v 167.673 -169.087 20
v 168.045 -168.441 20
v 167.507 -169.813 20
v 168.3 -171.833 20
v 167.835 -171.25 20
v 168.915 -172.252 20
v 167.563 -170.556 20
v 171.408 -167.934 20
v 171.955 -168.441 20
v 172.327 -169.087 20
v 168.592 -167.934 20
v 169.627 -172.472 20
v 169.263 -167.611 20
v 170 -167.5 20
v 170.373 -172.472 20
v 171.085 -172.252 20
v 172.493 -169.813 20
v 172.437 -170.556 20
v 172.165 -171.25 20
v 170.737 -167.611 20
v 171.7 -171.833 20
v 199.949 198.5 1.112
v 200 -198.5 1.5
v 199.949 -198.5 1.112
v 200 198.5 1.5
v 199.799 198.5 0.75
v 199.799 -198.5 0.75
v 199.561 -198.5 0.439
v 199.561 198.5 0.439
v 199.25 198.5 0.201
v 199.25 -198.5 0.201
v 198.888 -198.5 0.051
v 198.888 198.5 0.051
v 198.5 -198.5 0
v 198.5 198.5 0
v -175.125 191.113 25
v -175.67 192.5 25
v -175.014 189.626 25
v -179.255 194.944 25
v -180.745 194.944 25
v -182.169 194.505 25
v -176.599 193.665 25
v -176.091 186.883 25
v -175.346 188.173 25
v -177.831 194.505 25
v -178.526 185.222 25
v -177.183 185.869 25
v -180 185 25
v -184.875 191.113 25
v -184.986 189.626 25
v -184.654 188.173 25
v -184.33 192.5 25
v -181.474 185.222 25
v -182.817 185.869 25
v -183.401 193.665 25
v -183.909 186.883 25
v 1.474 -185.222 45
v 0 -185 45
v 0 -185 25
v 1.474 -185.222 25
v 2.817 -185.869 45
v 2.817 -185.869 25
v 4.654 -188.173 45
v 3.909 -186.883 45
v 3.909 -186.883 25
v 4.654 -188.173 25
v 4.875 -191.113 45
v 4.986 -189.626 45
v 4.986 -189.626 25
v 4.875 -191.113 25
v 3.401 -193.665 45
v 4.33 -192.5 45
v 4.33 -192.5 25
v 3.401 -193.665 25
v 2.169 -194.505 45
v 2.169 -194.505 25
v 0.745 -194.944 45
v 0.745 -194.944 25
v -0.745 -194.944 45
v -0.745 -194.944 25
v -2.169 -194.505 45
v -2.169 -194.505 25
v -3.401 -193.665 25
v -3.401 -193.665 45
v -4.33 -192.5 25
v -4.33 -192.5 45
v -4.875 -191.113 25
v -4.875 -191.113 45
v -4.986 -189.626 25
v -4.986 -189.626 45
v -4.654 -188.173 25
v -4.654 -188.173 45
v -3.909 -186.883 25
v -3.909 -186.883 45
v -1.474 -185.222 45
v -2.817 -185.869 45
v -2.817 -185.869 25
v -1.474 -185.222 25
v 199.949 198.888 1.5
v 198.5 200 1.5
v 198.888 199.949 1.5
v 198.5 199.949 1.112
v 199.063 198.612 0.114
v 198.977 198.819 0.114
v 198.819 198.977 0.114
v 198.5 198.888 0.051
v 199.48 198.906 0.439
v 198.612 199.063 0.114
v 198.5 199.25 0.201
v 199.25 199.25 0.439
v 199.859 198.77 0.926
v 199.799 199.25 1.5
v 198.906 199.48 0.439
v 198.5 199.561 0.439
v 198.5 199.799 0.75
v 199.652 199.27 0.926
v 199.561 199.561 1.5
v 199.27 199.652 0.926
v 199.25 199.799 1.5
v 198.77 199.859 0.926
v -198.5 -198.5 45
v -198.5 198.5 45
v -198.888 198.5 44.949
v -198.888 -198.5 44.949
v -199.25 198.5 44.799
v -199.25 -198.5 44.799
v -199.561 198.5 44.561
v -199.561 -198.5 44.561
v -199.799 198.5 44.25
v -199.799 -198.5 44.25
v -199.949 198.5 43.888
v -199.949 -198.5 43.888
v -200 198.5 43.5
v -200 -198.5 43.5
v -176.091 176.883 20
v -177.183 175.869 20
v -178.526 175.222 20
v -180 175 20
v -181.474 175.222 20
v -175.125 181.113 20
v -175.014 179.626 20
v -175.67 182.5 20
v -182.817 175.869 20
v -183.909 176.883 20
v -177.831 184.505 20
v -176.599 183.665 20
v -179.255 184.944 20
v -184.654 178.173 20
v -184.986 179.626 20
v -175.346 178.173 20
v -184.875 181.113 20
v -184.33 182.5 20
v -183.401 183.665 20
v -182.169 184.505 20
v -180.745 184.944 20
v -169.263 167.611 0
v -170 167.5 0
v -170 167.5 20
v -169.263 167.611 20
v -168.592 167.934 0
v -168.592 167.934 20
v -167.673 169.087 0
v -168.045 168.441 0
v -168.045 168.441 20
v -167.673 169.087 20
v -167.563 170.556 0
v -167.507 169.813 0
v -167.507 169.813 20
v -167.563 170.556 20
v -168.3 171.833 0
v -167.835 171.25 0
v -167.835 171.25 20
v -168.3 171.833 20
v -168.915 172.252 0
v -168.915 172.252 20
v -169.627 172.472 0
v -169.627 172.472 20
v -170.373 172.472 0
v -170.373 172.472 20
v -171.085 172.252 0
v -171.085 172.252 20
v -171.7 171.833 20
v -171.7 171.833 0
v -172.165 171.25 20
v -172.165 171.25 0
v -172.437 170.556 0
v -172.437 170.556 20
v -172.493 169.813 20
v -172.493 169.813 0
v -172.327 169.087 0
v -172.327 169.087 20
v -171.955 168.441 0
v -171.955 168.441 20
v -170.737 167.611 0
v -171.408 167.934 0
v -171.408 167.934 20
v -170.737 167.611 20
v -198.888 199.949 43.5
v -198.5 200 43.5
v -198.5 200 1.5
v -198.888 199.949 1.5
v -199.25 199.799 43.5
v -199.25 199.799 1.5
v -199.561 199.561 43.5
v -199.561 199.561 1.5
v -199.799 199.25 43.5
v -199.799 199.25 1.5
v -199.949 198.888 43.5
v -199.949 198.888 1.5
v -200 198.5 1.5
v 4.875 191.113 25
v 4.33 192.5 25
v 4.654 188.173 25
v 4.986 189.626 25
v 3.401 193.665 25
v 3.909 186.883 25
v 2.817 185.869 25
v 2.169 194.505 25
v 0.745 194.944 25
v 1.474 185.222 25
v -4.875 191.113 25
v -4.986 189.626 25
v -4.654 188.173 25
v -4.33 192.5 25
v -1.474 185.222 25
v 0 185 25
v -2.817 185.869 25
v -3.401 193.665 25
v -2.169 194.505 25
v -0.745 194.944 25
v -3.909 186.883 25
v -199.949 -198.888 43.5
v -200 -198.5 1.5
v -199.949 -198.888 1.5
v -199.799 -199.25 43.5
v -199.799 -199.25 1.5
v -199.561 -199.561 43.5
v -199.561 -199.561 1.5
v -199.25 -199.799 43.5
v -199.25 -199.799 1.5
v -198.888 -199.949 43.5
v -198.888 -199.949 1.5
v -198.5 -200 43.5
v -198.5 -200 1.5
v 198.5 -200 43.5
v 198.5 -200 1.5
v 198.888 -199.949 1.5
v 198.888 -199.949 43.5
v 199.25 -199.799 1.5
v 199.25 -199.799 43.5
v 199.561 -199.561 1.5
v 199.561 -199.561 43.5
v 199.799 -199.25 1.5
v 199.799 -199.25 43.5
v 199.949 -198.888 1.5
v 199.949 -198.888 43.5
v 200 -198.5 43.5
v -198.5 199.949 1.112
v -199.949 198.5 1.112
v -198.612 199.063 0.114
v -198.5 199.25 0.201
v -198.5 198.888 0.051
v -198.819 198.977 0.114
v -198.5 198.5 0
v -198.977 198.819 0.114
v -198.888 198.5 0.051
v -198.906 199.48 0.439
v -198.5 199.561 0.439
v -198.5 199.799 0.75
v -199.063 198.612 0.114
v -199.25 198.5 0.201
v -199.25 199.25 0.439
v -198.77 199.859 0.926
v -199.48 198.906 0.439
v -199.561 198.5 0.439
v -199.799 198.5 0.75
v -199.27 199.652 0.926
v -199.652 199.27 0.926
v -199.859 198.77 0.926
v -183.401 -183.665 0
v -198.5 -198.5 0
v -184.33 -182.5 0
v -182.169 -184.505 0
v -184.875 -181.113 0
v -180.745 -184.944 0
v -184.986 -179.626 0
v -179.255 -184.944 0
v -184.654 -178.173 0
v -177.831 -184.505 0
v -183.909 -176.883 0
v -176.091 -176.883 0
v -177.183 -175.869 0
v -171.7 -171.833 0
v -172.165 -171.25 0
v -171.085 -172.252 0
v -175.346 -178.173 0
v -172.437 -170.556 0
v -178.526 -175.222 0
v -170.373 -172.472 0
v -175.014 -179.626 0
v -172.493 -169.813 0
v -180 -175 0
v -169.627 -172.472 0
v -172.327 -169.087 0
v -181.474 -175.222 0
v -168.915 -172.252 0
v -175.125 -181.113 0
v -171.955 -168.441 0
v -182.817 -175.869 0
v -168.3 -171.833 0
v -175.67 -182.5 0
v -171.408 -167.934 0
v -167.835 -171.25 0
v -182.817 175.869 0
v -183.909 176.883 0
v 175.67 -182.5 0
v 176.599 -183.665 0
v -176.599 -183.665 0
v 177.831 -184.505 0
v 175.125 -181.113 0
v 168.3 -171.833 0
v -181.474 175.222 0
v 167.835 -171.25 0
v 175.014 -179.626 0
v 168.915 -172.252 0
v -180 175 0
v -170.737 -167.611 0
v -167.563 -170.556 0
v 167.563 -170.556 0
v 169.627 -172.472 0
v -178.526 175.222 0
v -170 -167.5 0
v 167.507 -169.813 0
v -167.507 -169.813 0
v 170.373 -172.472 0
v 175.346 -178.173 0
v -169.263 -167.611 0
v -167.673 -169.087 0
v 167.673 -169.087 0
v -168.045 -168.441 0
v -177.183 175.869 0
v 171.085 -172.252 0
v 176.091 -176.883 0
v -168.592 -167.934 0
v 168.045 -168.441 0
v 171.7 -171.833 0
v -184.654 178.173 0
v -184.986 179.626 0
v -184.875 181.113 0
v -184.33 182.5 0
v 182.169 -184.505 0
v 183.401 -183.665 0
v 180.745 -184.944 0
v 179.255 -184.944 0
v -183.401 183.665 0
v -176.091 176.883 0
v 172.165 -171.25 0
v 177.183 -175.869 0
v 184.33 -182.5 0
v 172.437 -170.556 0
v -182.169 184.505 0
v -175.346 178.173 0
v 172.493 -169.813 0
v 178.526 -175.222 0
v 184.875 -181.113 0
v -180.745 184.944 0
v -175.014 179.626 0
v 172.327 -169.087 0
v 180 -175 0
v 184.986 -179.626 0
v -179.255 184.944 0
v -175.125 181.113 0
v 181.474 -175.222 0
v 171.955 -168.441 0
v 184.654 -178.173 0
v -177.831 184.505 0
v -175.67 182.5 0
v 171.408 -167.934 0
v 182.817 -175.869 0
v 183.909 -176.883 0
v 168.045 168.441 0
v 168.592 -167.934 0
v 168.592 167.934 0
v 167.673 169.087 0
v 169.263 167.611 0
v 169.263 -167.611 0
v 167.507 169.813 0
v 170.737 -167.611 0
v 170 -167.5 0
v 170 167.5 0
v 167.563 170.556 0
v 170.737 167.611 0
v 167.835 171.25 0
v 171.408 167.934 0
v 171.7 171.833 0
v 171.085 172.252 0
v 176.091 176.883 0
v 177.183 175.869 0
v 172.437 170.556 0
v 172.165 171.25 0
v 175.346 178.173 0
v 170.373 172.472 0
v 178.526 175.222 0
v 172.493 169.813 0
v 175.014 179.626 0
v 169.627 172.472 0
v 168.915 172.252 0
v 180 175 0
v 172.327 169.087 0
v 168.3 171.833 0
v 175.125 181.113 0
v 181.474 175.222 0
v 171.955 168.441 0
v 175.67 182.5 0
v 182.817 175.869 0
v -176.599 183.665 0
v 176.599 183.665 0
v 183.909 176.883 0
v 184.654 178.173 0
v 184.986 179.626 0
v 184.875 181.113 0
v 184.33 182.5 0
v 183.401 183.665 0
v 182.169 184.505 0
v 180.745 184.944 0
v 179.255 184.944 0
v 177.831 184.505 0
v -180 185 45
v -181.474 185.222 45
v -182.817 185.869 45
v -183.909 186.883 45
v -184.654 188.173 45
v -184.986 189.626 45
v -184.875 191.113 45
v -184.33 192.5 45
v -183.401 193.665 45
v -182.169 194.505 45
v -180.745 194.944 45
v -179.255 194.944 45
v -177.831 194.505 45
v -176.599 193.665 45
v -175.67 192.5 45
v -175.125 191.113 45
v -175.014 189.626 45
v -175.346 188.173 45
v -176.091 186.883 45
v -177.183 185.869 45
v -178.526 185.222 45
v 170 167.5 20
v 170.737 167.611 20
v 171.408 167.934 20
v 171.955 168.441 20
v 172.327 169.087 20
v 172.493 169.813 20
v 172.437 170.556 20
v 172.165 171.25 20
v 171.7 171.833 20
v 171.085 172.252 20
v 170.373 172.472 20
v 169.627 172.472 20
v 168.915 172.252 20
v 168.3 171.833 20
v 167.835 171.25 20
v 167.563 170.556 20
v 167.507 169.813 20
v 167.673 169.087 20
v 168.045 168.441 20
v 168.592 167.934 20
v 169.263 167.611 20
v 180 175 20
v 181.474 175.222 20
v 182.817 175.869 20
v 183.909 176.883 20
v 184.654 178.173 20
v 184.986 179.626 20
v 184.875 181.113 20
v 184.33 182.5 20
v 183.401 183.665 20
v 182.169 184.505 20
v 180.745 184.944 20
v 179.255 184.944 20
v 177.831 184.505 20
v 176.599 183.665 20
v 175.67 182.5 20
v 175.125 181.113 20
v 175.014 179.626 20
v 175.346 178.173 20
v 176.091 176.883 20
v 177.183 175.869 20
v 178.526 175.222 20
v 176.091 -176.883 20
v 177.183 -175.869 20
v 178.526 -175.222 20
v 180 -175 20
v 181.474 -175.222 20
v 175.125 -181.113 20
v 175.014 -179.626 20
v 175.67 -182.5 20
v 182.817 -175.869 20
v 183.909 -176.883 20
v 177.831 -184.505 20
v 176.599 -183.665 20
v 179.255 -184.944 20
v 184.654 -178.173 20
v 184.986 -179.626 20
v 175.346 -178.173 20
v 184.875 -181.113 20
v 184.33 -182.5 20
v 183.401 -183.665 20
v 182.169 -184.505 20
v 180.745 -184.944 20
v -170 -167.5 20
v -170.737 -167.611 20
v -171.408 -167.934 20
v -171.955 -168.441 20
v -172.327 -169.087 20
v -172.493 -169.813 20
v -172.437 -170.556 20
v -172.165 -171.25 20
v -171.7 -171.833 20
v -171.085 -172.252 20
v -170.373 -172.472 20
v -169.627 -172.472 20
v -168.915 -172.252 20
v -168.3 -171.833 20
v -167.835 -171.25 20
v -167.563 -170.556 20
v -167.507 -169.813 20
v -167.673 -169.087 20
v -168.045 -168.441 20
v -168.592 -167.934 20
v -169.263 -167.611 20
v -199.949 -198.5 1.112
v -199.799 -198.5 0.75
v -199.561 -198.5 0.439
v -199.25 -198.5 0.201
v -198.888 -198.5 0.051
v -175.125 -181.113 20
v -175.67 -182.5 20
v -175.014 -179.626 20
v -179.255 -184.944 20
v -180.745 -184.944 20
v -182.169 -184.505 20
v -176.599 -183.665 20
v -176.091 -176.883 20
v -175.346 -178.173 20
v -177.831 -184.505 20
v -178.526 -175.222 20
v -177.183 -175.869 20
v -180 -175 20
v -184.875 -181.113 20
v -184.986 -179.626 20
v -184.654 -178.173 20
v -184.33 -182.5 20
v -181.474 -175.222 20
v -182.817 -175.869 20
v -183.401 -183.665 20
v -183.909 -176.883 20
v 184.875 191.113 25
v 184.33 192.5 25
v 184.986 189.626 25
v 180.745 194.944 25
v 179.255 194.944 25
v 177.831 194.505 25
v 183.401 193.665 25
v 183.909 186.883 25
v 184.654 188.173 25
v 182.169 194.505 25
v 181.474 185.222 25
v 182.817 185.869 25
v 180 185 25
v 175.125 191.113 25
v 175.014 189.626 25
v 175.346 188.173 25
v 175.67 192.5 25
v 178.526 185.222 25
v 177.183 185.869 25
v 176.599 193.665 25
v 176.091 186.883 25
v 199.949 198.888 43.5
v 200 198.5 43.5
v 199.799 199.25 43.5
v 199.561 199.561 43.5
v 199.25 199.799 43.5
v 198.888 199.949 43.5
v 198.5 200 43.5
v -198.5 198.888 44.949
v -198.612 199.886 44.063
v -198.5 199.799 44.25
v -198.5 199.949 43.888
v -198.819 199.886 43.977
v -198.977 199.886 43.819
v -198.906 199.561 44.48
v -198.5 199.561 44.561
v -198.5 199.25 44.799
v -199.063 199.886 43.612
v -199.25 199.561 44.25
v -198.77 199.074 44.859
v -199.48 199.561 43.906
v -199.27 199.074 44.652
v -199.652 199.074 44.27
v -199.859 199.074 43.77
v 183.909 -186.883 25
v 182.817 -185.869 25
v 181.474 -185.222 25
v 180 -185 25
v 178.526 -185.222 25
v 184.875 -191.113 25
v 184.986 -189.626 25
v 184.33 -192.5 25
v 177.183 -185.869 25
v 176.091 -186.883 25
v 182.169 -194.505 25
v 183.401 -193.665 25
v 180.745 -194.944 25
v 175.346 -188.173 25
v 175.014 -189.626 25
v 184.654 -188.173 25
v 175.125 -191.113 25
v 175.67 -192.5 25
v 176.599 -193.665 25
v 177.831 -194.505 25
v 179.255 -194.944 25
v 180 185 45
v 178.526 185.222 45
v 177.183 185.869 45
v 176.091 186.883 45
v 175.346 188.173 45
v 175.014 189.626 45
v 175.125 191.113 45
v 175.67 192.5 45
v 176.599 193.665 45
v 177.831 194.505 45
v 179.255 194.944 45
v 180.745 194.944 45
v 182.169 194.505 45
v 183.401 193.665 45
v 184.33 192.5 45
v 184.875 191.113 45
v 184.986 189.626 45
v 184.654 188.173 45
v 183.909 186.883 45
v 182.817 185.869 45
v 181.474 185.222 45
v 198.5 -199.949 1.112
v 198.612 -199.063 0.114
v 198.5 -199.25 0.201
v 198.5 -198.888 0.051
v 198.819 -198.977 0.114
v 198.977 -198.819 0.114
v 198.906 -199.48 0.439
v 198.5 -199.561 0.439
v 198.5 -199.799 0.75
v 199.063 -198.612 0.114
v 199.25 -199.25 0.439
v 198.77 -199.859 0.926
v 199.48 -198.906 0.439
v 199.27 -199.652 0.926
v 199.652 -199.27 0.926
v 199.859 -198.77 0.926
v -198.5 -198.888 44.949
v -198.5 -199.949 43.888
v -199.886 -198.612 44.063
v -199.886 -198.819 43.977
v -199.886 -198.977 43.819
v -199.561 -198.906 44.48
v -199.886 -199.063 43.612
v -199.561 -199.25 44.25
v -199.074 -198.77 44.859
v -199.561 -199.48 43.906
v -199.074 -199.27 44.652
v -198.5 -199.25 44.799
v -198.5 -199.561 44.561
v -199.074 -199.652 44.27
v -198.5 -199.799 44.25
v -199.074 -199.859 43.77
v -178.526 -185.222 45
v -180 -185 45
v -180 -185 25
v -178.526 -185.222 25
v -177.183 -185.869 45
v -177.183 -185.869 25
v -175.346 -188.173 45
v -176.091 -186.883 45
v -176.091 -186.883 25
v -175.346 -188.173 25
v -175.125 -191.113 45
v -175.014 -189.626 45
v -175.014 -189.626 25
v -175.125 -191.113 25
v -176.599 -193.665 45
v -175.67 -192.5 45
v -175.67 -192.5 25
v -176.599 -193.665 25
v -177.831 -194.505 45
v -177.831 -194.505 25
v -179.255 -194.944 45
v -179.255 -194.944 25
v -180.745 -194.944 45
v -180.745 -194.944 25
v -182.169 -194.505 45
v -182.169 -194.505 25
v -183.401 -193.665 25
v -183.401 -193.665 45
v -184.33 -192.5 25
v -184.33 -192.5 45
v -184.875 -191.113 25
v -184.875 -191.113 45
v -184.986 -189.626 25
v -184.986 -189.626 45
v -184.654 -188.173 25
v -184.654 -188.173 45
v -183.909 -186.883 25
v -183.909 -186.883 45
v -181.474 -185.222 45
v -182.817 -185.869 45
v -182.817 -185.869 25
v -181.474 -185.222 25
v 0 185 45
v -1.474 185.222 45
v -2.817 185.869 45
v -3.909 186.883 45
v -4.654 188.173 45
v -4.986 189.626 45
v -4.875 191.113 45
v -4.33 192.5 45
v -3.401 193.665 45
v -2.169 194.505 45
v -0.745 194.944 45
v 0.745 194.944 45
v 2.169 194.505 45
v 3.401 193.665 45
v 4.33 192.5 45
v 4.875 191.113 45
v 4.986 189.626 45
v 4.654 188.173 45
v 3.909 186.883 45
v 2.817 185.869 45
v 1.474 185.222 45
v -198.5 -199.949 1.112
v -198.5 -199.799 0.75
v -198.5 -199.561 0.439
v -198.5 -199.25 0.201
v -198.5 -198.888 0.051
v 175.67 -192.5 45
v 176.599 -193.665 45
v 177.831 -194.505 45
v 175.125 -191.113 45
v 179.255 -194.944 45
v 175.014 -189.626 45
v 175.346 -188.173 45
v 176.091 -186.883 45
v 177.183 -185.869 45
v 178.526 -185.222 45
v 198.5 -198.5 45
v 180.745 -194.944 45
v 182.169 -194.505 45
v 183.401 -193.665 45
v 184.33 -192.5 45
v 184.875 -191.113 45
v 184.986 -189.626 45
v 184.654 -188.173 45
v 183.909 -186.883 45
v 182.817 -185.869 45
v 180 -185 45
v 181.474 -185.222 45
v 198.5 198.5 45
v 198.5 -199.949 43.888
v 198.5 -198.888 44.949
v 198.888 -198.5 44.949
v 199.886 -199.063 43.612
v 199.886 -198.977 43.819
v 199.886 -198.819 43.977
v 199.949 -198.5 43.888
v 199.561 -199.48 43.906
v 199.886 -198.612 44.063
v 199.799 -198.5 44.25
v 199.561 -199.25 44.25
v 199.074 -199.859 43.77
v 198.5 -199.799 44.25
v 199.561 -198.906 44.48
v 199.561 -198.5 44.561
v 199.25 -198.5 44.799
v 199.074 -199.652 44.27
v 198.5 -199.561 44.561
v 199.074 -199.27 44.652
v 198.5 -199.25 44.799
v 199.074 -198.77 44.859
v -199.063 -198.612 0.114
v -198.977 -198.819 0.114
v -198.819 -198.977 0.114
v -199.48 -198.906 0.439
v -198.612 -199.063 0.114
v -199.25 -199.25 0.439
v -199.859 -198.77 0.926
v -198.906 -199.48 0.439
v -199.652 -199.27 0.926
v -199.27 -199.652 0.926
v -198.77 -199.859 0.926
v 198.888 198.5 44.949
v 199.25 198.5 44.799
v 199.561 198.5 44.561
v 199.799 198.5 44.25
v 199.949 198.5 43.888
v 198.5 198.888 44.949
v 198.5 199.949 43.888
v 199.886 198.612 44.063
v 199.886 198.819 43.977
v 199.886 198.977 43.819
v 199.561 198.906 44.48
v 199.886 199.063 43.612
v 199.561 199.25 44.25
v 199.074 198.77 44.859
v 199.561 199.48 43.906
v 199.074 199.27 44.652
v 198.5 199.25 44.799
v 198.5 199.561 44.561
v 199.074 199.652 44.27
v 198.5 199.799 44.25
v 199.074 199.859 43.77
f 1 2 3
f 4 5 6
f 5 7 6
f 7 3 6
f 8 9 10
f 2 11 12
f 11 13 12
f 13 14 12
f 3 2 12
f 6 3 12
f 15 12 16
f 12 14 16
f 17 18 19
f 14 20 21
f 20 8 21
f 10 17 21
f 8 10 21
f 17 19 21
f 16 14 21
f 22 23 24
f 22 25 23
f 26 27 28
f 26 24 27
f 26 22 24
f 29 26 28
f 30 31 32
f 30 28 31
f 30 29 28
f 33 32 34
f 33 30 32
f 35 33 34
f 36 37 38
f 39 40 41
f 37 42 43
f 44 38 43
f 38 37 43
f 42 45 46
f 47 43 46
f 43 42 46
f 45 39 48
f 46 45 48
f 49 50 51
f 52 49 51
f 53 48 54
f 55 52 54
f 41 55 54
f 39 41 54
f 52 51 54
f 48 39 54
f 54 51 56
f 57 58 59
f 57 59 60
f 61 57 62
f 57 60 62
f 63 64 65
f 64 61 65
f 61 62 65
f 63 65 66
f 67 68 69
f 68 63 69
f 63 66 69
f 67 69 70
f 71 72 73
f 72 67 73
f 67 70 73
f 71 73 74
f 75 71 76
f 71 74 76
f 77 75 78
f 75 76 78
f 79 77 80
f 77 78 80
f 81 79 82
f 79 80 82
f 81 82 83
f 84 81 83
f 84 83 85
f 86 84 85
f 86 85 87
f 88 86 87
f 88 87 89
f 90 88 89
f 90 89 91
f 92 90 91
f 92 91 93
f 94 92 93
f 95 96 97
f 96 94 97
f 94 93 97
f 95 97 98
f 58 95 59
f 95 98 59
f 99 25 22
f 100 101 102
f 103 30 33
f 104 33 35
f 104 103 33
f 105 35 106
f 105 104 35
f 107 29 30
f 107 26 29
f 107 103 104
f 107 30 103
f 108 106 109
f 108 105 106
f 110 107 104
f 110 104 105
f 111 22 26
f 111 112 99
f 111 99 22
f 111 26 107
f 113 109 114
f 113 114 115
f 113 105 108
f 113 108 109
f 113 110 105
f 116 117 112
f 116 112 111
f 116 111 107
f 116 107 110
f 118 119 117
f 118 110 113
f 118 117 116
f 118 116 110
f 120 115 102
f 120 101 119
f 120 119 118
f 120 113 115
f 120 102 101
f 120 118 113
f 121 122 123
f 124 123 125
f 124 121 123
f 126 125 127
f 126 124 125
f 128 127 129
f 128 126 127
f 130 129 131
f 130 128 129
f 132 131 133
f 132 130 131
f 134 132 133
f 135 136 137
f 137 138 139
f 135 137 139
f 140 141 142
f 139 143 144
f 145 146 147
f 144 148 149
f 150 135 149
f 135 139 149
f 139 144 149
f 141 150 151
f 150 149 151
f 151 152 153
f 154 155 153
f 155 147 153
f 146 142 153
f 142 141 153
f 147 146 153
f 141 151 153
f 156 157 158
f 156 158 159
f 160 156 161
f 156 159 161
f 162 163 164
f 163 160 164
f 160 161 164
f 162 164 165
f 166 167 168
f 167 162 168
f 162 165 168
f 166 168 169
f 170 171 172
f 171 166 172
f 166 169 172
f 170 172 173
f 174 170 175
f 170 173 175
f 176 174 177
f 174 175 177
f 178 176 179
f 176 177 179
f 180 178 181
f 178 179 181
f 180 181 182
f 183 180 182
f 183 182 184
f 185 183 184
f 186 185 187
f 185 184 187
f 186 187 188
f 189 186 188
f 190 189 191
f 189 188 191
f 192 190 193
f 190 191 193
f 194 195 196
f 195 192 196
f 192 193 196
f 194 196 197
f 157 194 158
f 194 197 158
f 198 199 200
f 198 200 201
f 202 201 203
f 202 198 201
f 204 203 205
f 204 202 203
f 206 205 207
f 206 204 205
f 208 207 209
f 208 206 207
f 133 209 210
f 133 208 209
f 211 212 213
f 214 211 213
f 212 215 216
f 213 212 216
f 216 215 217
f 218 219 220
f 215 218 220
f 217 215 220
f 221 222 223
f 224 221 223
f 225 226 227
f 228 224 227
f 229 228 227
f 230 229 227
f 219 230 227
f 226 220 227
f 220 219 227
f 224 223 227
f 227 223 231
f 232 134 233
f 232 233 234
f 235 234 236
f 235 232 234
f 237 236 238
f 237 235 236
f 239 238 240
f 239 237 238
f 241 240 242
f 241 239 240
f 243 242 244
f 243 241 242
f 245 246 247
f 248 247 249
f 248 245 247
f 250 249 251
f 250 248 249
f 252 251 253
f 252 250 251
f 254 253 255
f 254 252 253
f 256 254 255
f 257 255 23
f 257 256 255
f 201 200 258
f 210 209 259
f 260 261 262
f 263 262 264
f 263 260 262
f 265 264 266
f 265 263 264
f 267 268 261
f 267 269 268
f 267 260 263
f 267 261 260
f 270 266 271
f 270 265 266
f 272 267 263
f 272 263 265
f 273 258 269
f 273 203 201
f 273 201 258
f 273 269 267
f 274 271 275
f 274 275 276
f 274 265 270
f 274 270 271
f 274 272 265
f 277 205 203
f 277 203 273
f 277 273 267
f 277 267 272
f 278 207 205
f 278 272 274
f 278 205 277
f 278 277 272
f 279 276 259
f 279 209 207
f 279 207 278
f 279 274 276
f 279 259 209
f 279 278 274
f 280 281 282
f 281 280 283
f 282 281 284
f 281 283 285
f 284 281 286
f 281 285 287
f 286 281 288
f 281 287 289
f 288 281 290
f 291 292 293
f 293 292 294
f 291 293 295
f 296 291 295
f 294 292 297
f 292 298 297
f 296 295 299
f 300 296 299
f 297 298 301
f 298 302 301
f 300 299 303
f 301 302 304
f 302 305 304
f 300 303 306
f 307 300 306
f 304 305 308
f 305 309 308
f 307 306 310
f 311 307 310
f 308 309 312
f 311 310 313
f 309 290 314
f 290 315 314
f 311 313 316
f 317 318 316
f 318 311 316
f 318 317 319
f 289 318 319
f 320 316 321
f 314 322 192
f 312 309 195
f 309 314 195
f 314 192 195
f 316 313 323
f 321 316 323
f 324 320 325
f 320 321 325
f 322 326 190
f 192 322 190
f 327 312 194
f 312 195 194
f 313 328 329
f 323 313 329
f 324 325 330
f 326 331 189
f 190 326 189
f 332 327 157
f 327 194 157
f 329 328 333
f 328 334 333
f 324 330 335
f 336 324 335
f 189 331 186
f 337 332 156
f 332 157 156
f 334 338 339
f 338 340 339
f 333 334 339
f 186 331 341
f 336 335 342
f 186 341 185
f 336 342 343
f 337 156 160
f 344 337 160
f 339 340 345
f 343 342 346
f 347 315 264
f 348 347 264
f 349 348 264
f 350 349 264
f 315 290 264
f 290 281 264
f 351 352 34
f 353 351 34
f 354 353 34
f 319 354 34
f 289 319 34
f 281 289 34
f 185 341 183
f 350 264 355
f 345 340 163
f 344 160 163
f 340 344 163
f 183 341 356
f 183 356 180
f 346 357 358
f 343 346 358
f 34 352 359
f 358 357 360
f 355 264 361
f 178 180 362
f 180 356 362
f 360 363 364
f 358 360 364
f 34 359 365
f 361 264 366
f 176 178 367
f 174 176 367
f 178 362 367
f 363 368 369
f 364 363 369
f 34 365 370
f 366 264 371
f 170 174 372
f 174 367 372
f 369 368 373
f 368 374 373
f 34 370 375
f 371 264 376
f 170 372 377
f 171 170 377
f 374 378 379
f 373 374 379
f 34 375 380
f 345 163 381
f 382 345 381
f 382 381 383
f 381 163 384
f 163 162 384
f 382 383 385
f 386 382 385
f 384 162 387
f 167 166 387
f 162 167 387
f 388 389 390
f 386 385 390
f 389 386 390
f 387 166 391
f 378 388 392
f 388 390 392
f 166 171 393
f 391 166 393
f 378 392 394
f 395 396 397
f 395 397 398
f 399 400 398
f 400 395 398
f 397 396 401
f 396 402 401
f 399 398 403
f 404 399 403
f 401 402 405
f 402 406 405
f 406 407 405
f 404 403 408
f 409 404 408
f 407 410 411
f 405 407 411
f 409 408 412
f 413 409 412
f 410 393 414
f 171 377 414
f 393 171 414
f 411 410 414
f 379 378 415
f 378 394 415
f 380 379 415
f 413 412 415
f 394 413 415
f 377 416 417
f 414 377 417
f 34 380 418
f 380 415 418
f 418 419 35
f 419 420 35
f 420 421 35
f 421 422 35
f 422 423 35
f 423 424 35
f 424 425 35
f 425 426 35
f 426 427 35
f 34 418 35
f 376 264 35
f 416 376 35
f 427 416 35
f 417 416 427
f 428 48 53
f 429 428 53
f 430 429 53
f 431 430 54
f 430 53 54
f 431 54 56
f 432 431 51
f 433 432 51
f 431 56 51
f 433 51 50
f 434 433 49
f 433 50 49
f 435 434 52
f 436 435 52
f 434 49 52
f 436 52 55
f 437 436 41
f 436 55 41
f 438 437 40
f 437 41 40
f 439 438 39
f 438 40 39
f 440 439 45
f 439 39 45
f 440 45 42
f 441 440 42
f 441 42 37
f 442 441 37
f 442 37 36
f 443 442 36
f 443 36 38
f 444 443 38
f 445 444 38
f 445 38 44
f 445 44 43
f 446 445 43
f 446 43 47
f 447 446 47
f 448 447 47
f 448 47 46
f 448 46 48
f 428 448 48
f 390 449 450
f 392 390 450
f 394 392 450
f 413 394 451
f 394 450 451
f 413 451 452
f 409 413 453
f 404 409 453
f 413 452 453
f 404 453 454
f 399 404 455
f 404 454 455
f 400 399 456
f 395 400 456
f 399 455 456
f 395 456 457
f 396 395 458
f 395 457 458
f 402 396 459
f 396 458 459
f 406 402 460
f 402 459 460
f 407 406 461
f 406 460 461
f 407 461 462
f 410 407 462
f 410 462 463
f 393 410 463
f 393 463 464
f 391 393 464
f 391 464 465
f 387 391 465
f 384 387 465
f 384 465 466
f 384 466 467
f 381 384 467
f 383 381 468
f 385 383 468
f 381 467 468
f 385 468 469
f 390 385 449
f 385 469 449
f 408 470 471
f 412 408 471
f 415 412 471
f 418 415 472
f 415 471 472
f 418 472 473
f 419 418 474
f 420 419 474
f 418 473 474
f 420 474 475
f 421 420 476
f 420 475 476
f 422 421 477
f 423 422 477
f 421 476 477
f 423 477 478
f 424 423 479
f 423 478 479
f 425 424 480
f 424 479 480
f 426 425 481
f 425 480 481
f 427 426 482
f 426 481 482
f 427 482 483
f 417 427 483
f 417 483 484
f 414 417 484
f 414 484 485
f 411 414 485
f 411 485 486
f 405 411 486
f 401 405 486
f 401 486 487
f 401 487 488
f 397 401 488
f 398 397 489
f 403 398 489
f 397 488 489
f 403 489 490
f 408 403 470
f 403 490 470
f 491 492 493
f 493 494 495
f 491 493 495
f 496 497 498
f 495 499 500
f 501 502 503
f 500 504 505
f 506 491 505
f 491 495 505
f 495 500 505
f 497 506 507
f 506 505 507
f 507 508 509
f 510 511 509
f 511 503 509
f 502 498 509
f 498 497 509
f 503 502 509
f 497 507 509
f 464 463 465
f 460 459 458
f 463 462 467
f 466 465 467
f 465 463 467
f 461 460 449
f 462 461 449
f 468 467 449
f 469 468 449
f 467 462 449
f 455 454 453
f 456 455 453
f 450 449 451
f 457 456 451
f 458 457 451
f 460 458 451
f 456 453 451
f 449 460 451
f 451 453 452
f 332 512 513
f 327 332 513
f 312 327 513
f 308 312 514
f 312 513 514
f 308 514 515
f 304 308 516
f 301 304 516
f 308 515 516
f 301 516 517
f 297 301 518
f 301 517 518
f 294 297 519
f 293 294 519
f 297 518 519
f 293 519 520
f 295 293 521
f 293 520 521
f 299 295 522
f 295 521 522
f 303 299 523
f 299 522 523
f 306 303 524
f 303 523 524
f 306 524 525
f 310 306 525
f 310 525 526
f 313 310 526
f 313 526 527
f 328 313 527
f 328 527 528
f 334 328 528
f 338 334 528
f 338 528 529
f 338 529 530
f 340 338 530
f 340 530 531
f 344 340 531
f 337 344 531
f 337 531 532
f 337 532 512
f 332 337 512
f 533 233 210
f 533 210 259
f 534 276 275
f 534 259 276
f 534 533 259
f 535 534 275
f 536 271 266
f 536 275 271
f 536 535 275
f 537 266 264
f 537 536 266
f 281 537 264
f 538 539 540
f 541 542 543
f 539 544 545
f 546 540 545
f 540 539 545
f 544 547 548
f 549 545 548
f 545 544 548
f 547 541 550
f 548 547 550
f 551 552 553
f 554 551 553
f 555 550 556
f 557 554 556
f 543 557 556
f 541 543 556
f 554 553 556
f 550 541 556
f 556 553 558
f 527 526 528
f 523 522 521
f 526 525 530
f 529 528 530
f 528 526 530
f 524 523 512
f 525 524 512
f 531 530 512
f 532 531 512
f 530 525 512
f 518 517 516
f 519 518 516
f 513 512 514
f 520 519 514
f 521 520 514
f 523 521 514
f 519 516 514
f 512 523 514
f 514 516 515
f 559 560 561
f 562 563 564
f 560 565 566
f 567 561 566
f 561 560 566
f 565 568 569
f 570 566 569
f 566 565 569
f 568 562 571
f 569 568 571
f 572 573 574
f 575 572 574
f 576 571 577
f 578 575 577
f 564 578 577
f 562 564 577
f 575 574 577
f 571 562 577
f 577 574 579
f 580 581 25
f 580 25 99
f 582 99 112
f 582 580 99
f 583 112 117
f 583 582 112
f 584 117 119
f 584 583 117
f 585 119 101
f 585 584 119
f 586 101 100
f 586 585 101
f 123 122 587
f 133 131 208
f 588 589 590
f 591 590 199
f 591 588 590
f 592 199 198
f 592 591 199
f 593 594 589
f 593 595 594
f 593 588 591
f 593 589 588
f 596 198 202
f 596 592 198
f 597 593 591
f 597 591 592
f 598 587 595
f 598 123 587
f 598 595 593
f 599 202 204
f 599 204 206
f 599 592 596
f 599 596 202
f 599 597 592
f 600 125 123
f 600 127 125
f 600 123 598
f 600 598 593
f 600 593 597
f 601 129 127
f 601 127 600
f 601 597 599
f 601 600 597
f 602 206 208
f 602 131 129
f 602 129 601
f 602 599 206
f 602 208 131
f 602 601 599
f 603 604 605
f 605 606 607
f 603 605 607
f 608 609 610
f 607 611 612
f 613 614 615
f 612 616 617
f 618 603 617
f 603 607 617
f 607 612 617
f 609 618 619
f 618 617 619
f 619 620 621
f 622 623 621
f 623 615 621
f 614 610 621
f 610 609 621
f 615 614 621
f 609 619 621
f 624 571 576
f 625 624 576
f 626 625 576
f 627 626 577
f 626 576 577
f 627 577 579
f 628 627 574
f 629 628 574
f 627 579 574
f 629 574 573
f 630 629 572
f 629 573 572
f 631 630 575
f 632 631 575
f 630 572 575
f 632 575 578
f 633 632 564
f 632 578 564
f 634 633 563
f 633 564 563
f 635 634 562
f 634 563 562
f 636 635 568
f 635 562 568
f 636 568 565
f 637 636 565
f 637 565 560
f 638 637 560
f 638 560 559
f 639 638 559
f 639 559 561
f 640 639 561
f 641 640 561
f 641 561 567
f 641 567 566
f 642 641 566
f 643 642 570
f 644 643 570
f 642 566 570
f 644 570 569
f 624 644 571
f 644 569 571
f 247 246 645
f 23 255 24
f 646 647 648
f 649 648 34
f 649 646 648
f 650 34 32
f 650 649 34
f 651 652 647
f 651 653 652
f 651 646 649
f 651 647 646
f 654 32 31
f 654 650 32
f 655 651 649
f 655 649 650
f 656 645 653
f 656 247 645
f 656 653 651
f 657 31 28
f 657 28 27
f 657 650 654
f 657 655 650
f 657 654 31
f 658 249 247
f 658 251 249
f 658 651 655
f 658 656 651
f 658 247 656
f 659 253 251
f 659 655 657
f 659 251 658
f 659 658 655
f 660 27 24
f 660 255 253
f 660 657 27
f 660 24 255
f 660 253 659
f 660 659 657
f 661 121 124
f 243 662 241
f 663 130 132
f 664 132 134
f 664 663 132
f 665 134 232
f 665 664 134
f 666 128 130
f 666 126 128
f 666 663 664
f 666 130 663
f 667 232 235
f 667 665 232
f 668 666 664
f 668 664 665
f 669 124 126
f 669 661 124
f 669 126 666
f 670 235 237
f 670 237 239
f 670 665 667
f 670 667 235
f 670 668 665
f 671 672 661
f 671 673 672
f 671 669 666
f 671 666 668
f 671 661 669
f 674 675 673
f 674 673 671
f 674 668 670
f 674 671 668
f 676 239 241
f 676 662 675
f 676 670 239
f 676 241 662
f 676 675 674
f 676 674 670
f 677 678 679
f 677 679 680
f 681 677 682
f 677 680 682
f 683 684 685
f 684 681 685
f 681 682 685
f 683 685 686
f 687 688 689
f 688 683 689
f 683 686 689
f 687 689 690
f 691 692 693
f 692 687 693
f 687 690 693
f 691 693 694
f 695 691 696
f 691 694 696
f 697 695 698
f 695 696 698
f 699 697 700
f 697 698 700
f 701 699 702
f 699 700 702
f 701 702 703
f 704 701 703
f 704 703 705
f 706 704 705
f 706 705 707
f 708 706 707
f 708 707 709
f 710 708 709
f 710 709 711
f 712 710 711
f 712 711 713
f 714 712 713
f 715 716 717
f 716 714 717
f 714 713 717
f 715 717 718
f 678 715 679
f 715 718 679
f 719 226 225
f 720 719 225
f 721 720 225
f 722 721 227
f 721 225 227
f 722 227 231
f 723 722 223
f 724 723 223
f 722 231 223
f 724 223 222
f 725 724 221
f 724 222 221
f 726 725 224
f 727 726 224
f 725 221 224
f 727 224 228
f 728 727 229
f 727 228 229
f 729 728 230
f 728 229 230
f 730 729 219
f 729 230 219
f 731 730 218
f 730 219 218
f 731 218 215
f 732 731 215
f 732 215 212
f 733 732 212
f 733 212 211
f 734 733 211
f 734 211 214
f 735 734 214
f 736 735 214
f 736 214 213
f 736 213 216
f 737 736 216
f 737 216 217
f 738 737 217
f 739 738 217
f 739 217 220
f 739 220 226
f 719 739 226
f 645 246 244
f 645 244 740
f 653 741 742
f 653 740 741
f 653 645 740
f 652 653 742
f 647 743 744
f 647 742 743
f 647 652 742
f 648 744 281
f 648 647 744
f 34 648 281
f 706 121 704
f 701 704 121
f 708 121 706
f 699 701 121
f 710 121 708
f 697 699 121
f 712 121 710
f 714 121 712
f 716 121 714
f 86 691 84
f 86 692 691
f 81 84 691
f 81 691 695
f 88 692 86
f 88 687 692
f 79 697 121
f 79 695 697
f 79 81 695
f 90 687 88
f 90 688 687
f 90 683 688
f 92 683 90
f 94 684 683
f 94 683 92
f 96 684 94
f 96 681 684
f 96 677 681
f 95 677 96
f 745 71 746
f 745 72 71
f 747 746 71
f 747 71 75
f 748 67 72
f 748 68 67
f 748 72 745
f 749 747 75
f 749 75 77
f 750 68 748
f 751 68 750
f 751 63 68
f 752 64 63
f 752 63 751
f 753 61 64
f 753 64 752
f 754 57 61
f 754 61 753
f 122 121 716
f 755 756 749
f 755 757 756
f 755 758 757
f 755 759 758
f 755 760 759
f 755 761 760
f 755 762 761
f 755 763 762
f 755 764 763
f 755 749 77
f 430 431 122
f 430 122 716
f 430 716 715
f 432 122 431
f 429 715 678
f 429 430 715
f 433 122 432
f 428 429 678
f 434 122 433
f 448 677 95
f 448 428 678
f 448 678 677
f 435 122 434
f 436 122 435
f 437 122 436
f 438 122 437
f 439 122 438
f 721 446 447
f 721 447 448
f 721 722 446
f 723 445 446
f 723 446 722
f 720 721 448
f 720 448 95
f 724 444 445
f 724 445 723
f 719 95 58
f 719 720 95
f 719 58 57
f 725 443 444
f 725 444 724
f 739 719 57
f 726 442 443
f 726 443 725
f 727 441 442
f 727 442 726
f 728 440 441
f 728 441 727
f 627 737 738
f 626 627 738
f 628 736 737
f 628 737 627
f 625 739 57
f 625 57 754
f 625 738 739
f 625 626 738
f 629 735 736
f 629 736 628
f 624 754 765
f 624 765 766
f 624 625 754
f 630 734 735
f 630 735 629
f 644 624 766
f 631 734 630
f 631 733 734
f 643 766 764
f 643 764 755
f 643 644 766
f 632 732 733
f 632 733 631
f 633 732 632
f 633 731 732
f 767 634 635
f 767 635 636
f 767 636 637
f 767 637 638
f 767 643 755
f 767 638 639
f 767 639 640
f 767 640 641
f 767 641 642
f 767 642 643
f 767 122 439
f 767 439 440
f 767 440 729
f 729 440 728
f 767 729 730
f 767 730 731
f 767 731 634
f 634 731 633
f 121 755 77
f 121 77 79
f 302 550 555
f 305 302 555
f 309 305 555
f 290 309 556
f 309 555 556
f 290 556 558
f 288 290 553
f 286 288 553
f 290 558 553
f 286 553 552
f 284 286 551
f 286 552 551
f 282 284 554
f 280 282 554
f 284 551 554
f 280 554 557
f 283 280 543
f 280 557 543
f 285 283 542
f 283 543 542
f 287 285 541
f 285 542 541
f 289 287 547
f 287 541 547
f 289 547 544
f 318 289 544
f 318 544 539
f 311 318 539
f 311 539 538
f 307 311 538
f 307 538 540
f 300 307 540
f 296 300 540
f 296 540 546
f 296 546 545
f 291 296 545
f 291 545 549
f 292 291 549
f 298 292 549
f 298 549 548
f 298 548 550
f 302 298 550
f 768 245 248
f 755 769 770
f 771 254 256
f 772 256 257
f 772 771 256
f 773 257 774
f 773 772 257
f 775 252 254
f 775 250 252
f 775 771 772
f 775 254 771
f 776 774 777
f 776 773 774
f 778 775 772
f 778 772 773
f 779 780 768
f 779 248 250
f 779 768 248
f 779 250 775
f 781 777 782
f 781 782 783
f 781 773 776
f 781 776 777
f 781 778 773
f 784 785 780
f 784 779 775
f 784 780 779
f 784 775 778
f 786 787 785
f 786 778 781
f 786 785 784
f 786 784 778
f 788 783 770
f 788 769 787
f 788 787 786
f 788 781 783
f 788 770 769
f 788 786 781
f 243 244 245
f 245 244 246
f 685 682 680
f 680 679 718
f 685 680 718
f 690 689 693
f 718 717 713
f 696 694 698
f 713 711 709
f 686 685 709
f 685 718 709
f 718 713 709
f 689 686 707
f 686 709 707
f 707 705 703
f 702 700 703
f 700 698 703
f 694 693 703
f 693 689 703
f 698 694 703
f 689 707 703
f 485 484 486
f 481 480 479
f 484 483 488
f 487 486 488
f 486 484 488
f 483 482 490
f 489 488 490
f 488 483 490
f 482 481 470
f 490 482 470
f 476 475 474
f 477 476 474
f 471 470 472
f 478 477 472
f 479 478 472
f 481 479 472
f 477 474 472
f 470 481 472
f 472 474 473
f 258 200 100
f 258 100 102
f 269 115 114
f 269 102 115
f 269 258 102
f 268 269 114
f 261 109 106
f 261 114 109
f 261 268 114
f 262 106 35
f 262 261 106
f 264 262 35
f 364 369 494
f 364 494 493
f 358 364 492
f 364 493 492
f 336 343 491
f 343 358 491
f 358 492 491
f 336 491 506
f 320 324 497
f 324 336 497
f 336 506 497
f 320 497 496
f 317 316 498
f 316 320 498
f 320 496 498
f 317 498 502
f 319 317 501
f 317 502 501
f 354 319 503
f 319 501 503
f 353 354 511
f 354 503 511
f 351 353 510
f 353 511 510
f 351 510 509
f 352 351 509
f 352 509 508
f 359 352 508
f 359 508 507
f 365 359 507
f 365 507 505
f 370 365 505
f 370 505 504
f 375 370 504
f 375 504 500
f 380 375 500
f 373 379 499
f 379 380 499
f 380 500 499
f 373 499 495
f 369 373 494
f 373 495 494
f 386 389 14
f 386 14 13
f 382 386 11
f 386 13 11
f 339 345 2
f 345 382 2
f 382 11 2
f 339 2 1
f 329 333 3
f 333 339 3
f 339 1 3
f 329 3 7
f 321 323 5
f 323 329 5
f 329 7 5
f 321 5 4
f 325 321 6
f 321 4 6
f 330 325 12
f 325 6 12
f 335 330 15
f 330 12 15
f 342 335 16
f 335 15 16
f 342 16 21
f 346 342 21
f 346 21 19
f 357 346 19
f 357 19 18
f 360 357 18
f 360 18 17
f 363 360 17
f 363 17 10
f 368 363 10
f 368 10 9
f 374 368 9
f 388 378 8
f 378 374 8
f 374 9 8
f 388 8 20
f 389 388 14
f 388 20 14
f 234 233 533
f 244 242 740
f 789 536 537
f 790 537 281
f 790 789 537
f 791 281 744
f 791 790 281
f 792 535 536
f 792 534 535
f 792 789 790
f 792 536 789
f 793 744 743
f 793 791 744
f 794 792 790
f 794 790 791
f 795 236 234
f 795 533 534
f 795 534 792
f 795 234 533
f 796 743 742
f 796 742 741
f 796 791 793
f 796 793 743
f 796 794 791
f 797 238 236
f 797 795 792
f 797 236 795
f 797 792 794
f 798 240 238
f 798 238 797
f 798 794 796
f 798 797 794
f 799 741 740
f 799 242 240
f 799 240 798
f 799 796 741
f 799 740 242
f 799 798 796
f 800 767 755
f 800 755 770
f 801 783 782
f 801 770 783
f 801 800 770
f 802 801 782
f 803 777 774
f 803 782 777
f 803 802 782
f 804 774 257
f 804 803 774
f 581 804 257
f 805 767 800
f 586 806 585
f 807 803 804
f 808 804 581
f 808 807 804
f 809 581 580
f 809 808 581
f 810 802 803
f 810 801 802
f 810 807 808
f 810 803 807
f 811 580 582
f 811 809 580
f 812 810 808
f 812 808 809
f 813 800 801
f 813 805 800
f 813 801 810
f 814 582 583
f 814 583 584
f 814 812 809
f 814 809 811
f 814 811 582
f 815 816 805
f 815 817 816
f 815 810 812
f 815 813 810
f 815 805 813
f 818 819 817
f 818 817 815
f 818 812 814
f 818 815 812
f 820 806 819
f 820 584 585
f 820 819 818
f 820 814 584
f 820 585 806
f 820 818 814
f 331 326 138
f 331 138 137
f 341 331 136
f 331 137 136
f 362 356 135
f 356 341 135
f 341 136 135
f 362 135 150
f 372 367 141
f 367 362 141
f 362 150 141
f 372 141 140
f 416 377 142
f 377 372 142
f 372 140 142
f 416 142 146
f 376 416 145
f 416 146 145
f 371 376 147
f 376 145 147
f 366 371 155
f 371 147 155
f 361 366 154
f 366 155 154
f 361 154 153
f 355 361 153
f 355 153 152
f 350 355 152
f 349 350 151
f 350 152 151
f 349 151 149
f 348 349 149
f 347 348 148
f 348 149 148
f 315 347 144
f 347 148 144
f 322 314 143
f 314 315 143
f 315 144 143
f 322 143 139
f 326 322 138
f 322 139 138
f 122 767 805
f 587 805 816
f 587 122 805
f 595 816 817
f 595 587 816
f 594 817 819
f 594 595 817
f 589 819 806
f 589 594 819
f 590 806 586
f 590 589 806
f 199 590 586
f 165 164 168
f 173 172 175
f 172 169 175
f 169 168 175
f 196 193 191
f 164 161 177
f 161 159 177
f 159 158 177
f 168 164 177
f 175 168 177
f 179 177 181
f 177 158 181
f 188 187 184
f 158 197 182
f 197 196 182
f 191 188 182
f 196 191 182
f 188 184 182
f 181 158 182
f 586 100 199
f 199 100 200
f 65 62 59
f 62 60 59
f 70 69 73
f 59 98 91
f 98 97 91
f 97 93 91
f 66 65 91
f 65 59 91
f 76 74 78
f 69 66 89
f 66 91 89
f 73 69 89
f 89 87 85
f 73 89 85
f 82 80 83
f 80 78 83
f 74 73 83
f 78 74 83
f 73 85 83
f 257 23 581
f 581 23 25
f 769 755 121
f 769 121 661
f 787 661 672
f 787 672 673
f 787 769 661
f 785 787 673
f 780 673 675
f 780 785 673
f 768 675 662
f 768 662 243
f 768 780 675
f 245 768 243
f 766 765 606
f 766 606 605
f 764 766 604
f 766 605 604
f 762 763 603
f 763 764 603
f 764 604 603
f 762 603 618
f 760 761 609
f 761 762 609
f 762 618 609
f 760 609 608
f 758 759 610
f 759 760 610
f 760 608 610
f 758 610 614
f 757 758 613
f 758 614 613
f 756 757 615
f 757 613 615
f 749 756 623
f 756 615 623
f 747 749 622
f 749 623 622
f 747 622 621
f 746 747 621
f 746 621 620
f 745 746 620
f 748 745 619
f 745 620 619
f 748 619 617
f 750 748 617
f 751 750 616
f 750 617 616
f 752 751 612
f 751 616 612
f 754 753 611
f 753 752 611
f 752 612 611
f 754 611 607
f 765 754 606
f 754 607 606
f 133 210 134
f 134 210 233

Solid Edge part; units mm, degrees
sketch "Sketch1" plane through (0, 0, 0) normal (0, 0, 1) x (1, 0, 0)
  line L0 (-200, -200) -> (200, -200)
  line L1 (200, -200) -> (200, 200)
  line L2 (200, 200) -> (-200, 200)
  line L3 (-200, 200) -> (-200, -200)
extrude "Protrusion1" add sketch "Sketch1" along normal blind 45
fillet "Round_3" radius 1.5 12 edges at (0, -200, 45) (-200, 0, 45) (0, 200, 45) (200, 0, 45) (200, -200, 22.5) (200, 200, 22.5) (-200, 200, 22.5) (-200, -200, 22.5) (0, -200, 0) (-200, 0, 0) (0, 200, 0) (200, 0, 0)
hole "Hole_19" at (-180, -180, 0) direction (0, 0, 1) diameter 10 depth 20
hole "Hole_20" at (-170, -170, 0) direction (0, 0, 1) diameter 5 depth 20
mirror "Mirror1" about plane through (0, 0, 0) normal (1, 0, 0) of "Hole_20", "Hole_19"
mirror "Mirror2" about plane through (0, 0, 0) normal (0, -1, 0) of "Hole_19", "Hole_20", "Mirror1"
hole "Hole_30" at (180, 190, 45) direction (0, 0, -1) diameter 10 depth 20
hole "Hole7" at (0, 190, 45) direction (0, 0, -1) diameter 10 depth 20
hole "Hole8" at (-180, 190, 45) direction (0, 0, -1) diameter 10 depth 20
mirror "Mirror3" about plane through (0, 0, 0) normal (0, -1, 0) of "Hole_30", "Hole7", "Hole8"
properties material "Wood, Oak"
